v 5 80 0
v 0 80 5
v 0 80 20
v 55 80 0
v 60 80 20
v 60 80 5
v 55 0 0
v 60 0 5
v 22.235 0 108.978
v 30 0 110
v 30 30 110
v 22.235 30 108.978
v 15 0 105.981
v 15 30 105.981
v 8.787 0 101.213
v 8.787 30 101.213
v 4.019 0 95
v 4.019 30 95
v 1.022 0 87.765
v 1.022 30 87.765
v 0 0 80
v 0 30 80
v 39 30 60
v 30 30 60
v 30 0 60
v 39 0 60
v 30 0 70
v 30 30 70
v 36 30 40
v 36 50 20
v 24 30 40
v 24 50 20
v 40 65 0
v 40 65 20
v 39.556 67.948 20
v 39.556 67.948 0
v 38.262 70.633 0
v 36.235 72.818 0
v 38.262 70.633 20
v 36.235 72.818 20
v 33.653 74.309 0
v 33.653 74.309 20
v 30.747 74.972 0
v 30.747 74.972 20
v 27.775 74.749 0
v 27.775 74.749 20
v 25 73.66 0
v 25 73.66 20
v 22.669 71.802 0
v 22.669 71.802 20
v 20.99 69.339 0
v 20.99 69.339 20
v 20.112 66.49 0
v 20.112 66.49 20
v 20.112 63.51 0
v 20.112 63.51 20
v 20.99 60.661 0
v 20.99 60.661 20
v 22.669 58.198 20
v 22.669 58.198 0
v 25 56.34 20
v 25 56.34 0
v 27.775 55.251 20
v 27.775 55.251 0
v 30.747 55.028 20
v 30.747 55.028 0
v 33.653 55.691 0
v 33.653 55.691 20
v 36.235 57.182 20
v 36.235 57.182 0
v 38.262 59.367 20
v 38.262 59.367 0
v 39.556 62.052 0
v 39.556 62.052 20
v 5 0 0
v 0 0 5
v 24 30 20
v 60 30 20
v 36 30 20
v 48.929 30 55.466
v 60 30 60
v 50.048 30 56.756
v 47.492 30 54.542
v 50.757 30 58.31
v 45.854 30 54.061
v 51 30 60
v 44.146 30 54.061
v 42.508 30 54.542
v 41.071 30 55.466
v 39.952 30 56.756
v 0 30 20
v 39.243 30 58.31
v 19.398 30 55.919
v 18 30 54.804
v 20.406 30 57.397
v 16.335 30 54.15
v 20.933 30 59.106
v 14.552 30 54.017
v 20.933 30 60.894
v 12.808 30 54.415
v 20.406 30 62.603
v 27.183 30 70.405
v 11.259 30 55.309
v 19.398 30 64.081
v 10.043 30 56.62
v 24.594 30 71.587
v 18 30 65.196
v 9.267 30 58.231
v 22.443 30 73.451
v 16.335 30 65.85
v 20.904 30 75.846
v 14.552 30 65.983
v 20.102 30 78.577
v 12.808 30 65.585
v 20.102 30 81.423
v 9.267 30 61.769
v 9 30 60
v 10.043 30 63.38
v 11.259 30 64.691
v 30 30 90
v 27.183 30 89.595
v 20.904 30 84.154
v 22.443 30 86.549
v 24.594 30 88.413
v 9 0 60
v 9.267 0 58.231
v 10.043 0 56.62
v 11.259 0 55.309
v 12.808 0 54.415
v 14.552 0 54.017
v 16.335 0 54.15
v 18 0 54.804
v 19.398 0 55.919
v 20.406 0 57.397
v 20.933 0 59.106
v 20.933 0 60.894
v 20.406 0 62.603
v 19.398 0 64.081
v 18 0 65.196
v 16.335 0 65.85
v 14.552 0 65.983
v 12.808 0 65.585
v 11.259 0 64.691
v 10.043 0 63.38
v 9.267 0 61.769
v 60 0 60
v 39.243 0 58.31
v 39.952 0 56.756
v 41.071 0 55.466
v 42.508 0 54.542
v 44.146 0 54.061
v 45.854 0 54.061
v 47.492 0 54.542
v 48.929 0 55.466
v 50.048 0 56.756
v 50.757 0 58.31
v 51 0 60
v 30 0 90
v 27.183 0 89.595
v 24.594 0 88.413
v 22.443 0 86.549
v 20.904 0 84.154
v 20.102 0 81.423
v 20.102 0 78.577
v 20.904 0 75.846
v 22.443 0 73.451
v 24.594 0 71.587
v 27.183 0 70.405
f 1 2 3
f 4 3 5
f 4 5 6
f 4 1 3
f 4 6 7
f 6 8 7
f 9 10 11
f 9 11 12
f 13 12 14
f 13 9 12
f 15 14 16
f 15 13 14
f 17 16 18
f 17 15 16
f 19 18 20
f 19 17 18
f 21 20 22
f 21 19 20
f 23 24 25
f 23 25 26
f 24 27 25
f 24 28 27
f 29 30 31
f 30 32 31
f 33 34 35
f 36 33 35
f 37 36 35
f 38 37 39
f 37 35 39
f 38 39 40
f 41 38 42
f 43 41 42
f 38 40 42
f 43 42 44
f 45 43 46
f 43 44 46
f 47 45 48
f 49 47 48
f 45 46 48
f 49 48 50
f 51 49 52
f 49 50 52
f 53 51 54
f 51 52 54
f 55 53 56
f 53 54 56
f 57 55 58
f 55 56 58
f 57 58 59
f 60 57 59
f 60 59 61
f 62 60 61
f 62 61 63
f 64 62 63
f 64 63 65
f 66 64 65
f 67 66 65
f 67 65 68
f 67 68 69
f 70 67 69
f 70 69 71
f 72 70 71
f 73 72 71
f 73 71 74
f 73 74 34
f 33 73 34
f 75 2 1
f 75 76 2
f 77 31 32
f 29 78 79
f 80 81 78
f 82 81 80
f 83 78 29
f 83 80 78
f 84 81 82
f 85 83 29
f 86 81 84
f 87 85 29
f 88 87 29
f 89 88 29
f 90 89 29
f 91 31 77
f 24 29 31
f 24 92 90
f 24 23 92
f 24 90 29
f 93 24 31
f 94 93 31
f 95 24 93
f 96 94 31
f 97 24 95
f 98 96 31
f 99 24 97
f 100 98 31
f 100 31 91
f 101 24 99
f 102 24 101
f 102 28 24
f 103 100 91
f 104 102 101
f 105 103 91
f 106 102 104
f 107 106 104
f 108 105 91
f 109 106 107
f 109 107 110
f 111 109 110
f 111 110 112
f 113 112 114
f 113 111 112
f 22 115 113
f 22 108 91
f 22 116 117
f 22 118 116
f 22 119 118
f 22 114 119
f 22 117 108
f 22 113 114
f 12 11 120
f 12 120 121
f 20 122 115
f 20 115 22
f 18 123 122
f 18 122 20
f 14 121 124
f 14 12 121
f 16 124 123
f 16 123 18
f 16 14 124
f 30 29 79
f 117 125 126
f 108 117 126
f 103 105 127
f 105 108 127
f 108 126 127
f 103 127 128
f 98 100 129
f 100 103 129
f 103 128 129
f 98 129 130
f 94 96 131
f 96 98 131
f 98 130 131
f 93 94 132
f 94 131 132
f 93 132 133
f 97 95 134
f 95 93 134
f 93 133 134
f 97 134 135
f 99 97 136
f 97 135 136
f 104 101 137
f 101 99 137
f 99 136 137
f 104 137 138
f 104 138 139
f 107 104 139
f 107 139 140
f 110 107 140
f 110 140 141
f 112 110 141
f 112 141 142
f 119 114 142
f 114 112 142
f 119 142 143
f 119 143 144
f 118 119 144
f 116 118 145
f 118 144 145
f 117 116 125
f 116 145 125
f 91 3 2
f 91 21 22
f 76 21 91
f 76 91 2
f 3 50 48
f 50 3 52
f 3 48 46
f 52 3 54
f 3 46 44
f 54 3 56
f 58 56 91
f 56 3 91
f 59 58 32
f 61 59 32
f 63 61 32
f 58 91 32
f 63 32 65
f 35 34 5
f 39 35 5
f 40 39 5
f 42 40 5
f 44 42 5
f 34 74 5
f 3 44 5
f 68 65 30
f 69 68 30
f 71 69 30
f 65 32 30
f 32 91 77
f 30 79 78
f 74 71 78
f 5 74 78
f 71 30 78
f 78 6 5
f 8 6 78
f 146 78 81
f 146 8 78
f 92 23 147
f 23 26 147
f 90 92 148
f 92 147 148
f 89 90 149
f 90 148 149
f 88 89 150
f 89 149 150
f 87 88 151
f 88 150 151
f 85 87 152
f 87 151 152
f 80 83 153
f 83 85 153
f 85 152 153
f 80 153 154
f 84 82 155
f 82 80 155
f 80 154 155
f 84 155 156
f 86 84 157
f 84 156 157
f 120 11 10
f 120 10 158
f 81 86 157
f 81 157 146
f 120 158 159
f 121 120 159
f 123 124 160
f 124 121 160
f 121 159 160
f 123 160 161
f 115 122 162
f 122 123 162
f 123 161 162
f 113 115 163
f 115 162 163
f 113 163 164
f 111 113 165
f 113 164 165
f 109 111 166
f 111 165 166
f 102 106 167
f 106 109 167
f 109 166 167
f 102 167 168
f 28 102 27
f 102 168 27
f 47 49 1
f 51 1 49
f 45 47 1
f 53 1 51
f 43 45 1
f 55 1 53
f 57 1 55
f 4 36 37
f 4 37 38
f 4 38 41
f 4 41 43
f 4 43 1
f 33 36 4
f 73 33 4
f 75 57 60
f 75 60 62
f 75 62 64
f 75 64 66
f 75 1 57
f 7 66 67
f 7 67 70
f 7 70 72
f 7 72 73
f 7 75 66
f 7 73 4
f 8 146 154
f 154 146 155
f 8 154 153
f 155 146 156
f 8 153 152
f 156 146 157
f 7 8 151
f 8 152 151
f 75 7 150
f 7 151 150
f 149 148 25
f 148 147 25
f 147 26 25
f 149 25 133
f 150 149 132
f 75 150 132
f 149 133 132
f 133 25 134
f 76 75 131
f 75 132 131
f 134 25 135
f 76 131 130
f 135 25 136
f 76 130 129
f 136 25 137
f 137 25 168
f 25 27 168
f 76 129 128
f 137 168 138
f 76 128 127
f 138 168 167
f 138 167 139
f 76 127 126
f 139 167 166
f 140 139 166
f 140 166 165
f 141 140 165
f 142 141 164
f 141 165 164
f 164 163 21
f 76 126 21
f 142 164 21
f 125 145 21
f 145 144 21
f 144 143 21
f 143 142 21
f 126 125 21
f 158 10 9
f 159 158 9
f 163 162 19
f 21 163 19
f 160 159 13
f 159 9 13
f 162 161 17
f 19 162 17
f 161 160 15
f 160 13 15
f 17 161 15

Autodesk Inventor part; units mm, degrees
ref_plane "YZ Plane" through (0, 0, 0) normal (1, 0, 0) x (0, 1, 0)
ref_plane "XZ Plane" through (0, 0, 0) normal (0, 1, 0) x (-1, 0, 0)
sketch "Эскиз1" plane through (0, 0, 0) normal (0, 1, 0) x (-1, 0, 0)
  line L0 (-5, 0) -> (-55, 0)
  line L1 (-60, 5) -> (-60, 80)
  line L2 (0, 80) -> (0, 5)
  arc A0 (0, 80) -> (-60, 80) centre (-30, 80) ccw
  circle A1 centre (-30, 80) radius 10
  circle A2 centre (-15, 60) radius 6
  circle A3 centre (-45, 60) radius 6
  line L3 (0, 5) -> (-5, 0)
  line L4 (-60, 5) -> (-55, 0)
  point P0 (0, 0)
  point P1 (-60, 0)
  dimension "d4" = 80
  dimension "d5" = 20
  dimension "d8" = 12
  dimension "d9" = 12
  dimension "d12" = 5
  dimension "d13" = 45
  dimension "d14" = 5
  dimension "d15" = 45
extrude "Выдавливание1" add sketch "Эскиз1" along normal blind 30
sketch "Эскиз2" plane through (0, 30, 0) normal (0, 1, 0) x (1, 0, 0)
  line L0 (0, -20) -> (60, -20)
  line L1 (60, -80) -> (60, -5) projected
  line L2 (60, -5) -> (55, 0) projected
  line L3 (60, -5) -> (55, 0)
  line L4 (55, 0) -> (5, 0) projected
  line L5 (55, 0) -> (5, 0)
  line L6 (5, 0) -> (0, -5) projected
  line L7 (5, 0) -> (0, -5)
  line L8 (0, -5) -> (0, -20)
  line L9 (0, -5) -> (0, -80) projected
  point P0 (0, 0)
extrude "Выдавливание2" add sketch "Эскиз2" along normal blind 50
sketch "Эскиз3" plane through (0, 30, 20) normal (0, 0, 1) x (1, 0, 0)
  circle A0 centre (30, 35) radius 10
  line L0 (60, 0) -> (0, 0) projected
  point P0 (0, -30)
  dimension "d18" = 20
extrude "Выдавливание3" cut sketch "Эскиз3" against normal blind 50
ref_plane "РабПлоскость1" through (30, 0, 80) normal (1, 0, 0) x (0, 0, -1)
sketch "Эскиз6" plane through (30, 0, 80) normal (1, 0, 0) x (0, 0, -1)
  line L0 (60, 30) -> (0, 30) projected
  line L1 (40, 30) -> (60, 30)
  line L2 (60, 30) -> (60, 50)
  line L3 (60, 30) -> (60, 80) projected
  line L4 (60, 50) -> (40, 30)
  point P0 (80, 0)
  dimension "d26" = 20
extrude "Выдавливание4" add sketch "Эскиз6" along normal mid plane 12
sketch "Эскиз7" plane through (0, 30, 0) normal (0, 1, 0) x (1, 0, 0)
  line L0 (30, -60) -> (71.6431, -60)
  line L1 (71.6431, -60) -> (71.6431, -124.6271)
  line L2 (71.6431, -124.6271) -> (30, -124.6271)
  line L3 (30, -124.6271) -> (30, -60)
  point P0 (0, 0)
extrude "Выдавливание5" cut sketch "Эскиз7" against normal blind 50
equation "\"d14\" = d12"
equation "\"d15\" = d13"
